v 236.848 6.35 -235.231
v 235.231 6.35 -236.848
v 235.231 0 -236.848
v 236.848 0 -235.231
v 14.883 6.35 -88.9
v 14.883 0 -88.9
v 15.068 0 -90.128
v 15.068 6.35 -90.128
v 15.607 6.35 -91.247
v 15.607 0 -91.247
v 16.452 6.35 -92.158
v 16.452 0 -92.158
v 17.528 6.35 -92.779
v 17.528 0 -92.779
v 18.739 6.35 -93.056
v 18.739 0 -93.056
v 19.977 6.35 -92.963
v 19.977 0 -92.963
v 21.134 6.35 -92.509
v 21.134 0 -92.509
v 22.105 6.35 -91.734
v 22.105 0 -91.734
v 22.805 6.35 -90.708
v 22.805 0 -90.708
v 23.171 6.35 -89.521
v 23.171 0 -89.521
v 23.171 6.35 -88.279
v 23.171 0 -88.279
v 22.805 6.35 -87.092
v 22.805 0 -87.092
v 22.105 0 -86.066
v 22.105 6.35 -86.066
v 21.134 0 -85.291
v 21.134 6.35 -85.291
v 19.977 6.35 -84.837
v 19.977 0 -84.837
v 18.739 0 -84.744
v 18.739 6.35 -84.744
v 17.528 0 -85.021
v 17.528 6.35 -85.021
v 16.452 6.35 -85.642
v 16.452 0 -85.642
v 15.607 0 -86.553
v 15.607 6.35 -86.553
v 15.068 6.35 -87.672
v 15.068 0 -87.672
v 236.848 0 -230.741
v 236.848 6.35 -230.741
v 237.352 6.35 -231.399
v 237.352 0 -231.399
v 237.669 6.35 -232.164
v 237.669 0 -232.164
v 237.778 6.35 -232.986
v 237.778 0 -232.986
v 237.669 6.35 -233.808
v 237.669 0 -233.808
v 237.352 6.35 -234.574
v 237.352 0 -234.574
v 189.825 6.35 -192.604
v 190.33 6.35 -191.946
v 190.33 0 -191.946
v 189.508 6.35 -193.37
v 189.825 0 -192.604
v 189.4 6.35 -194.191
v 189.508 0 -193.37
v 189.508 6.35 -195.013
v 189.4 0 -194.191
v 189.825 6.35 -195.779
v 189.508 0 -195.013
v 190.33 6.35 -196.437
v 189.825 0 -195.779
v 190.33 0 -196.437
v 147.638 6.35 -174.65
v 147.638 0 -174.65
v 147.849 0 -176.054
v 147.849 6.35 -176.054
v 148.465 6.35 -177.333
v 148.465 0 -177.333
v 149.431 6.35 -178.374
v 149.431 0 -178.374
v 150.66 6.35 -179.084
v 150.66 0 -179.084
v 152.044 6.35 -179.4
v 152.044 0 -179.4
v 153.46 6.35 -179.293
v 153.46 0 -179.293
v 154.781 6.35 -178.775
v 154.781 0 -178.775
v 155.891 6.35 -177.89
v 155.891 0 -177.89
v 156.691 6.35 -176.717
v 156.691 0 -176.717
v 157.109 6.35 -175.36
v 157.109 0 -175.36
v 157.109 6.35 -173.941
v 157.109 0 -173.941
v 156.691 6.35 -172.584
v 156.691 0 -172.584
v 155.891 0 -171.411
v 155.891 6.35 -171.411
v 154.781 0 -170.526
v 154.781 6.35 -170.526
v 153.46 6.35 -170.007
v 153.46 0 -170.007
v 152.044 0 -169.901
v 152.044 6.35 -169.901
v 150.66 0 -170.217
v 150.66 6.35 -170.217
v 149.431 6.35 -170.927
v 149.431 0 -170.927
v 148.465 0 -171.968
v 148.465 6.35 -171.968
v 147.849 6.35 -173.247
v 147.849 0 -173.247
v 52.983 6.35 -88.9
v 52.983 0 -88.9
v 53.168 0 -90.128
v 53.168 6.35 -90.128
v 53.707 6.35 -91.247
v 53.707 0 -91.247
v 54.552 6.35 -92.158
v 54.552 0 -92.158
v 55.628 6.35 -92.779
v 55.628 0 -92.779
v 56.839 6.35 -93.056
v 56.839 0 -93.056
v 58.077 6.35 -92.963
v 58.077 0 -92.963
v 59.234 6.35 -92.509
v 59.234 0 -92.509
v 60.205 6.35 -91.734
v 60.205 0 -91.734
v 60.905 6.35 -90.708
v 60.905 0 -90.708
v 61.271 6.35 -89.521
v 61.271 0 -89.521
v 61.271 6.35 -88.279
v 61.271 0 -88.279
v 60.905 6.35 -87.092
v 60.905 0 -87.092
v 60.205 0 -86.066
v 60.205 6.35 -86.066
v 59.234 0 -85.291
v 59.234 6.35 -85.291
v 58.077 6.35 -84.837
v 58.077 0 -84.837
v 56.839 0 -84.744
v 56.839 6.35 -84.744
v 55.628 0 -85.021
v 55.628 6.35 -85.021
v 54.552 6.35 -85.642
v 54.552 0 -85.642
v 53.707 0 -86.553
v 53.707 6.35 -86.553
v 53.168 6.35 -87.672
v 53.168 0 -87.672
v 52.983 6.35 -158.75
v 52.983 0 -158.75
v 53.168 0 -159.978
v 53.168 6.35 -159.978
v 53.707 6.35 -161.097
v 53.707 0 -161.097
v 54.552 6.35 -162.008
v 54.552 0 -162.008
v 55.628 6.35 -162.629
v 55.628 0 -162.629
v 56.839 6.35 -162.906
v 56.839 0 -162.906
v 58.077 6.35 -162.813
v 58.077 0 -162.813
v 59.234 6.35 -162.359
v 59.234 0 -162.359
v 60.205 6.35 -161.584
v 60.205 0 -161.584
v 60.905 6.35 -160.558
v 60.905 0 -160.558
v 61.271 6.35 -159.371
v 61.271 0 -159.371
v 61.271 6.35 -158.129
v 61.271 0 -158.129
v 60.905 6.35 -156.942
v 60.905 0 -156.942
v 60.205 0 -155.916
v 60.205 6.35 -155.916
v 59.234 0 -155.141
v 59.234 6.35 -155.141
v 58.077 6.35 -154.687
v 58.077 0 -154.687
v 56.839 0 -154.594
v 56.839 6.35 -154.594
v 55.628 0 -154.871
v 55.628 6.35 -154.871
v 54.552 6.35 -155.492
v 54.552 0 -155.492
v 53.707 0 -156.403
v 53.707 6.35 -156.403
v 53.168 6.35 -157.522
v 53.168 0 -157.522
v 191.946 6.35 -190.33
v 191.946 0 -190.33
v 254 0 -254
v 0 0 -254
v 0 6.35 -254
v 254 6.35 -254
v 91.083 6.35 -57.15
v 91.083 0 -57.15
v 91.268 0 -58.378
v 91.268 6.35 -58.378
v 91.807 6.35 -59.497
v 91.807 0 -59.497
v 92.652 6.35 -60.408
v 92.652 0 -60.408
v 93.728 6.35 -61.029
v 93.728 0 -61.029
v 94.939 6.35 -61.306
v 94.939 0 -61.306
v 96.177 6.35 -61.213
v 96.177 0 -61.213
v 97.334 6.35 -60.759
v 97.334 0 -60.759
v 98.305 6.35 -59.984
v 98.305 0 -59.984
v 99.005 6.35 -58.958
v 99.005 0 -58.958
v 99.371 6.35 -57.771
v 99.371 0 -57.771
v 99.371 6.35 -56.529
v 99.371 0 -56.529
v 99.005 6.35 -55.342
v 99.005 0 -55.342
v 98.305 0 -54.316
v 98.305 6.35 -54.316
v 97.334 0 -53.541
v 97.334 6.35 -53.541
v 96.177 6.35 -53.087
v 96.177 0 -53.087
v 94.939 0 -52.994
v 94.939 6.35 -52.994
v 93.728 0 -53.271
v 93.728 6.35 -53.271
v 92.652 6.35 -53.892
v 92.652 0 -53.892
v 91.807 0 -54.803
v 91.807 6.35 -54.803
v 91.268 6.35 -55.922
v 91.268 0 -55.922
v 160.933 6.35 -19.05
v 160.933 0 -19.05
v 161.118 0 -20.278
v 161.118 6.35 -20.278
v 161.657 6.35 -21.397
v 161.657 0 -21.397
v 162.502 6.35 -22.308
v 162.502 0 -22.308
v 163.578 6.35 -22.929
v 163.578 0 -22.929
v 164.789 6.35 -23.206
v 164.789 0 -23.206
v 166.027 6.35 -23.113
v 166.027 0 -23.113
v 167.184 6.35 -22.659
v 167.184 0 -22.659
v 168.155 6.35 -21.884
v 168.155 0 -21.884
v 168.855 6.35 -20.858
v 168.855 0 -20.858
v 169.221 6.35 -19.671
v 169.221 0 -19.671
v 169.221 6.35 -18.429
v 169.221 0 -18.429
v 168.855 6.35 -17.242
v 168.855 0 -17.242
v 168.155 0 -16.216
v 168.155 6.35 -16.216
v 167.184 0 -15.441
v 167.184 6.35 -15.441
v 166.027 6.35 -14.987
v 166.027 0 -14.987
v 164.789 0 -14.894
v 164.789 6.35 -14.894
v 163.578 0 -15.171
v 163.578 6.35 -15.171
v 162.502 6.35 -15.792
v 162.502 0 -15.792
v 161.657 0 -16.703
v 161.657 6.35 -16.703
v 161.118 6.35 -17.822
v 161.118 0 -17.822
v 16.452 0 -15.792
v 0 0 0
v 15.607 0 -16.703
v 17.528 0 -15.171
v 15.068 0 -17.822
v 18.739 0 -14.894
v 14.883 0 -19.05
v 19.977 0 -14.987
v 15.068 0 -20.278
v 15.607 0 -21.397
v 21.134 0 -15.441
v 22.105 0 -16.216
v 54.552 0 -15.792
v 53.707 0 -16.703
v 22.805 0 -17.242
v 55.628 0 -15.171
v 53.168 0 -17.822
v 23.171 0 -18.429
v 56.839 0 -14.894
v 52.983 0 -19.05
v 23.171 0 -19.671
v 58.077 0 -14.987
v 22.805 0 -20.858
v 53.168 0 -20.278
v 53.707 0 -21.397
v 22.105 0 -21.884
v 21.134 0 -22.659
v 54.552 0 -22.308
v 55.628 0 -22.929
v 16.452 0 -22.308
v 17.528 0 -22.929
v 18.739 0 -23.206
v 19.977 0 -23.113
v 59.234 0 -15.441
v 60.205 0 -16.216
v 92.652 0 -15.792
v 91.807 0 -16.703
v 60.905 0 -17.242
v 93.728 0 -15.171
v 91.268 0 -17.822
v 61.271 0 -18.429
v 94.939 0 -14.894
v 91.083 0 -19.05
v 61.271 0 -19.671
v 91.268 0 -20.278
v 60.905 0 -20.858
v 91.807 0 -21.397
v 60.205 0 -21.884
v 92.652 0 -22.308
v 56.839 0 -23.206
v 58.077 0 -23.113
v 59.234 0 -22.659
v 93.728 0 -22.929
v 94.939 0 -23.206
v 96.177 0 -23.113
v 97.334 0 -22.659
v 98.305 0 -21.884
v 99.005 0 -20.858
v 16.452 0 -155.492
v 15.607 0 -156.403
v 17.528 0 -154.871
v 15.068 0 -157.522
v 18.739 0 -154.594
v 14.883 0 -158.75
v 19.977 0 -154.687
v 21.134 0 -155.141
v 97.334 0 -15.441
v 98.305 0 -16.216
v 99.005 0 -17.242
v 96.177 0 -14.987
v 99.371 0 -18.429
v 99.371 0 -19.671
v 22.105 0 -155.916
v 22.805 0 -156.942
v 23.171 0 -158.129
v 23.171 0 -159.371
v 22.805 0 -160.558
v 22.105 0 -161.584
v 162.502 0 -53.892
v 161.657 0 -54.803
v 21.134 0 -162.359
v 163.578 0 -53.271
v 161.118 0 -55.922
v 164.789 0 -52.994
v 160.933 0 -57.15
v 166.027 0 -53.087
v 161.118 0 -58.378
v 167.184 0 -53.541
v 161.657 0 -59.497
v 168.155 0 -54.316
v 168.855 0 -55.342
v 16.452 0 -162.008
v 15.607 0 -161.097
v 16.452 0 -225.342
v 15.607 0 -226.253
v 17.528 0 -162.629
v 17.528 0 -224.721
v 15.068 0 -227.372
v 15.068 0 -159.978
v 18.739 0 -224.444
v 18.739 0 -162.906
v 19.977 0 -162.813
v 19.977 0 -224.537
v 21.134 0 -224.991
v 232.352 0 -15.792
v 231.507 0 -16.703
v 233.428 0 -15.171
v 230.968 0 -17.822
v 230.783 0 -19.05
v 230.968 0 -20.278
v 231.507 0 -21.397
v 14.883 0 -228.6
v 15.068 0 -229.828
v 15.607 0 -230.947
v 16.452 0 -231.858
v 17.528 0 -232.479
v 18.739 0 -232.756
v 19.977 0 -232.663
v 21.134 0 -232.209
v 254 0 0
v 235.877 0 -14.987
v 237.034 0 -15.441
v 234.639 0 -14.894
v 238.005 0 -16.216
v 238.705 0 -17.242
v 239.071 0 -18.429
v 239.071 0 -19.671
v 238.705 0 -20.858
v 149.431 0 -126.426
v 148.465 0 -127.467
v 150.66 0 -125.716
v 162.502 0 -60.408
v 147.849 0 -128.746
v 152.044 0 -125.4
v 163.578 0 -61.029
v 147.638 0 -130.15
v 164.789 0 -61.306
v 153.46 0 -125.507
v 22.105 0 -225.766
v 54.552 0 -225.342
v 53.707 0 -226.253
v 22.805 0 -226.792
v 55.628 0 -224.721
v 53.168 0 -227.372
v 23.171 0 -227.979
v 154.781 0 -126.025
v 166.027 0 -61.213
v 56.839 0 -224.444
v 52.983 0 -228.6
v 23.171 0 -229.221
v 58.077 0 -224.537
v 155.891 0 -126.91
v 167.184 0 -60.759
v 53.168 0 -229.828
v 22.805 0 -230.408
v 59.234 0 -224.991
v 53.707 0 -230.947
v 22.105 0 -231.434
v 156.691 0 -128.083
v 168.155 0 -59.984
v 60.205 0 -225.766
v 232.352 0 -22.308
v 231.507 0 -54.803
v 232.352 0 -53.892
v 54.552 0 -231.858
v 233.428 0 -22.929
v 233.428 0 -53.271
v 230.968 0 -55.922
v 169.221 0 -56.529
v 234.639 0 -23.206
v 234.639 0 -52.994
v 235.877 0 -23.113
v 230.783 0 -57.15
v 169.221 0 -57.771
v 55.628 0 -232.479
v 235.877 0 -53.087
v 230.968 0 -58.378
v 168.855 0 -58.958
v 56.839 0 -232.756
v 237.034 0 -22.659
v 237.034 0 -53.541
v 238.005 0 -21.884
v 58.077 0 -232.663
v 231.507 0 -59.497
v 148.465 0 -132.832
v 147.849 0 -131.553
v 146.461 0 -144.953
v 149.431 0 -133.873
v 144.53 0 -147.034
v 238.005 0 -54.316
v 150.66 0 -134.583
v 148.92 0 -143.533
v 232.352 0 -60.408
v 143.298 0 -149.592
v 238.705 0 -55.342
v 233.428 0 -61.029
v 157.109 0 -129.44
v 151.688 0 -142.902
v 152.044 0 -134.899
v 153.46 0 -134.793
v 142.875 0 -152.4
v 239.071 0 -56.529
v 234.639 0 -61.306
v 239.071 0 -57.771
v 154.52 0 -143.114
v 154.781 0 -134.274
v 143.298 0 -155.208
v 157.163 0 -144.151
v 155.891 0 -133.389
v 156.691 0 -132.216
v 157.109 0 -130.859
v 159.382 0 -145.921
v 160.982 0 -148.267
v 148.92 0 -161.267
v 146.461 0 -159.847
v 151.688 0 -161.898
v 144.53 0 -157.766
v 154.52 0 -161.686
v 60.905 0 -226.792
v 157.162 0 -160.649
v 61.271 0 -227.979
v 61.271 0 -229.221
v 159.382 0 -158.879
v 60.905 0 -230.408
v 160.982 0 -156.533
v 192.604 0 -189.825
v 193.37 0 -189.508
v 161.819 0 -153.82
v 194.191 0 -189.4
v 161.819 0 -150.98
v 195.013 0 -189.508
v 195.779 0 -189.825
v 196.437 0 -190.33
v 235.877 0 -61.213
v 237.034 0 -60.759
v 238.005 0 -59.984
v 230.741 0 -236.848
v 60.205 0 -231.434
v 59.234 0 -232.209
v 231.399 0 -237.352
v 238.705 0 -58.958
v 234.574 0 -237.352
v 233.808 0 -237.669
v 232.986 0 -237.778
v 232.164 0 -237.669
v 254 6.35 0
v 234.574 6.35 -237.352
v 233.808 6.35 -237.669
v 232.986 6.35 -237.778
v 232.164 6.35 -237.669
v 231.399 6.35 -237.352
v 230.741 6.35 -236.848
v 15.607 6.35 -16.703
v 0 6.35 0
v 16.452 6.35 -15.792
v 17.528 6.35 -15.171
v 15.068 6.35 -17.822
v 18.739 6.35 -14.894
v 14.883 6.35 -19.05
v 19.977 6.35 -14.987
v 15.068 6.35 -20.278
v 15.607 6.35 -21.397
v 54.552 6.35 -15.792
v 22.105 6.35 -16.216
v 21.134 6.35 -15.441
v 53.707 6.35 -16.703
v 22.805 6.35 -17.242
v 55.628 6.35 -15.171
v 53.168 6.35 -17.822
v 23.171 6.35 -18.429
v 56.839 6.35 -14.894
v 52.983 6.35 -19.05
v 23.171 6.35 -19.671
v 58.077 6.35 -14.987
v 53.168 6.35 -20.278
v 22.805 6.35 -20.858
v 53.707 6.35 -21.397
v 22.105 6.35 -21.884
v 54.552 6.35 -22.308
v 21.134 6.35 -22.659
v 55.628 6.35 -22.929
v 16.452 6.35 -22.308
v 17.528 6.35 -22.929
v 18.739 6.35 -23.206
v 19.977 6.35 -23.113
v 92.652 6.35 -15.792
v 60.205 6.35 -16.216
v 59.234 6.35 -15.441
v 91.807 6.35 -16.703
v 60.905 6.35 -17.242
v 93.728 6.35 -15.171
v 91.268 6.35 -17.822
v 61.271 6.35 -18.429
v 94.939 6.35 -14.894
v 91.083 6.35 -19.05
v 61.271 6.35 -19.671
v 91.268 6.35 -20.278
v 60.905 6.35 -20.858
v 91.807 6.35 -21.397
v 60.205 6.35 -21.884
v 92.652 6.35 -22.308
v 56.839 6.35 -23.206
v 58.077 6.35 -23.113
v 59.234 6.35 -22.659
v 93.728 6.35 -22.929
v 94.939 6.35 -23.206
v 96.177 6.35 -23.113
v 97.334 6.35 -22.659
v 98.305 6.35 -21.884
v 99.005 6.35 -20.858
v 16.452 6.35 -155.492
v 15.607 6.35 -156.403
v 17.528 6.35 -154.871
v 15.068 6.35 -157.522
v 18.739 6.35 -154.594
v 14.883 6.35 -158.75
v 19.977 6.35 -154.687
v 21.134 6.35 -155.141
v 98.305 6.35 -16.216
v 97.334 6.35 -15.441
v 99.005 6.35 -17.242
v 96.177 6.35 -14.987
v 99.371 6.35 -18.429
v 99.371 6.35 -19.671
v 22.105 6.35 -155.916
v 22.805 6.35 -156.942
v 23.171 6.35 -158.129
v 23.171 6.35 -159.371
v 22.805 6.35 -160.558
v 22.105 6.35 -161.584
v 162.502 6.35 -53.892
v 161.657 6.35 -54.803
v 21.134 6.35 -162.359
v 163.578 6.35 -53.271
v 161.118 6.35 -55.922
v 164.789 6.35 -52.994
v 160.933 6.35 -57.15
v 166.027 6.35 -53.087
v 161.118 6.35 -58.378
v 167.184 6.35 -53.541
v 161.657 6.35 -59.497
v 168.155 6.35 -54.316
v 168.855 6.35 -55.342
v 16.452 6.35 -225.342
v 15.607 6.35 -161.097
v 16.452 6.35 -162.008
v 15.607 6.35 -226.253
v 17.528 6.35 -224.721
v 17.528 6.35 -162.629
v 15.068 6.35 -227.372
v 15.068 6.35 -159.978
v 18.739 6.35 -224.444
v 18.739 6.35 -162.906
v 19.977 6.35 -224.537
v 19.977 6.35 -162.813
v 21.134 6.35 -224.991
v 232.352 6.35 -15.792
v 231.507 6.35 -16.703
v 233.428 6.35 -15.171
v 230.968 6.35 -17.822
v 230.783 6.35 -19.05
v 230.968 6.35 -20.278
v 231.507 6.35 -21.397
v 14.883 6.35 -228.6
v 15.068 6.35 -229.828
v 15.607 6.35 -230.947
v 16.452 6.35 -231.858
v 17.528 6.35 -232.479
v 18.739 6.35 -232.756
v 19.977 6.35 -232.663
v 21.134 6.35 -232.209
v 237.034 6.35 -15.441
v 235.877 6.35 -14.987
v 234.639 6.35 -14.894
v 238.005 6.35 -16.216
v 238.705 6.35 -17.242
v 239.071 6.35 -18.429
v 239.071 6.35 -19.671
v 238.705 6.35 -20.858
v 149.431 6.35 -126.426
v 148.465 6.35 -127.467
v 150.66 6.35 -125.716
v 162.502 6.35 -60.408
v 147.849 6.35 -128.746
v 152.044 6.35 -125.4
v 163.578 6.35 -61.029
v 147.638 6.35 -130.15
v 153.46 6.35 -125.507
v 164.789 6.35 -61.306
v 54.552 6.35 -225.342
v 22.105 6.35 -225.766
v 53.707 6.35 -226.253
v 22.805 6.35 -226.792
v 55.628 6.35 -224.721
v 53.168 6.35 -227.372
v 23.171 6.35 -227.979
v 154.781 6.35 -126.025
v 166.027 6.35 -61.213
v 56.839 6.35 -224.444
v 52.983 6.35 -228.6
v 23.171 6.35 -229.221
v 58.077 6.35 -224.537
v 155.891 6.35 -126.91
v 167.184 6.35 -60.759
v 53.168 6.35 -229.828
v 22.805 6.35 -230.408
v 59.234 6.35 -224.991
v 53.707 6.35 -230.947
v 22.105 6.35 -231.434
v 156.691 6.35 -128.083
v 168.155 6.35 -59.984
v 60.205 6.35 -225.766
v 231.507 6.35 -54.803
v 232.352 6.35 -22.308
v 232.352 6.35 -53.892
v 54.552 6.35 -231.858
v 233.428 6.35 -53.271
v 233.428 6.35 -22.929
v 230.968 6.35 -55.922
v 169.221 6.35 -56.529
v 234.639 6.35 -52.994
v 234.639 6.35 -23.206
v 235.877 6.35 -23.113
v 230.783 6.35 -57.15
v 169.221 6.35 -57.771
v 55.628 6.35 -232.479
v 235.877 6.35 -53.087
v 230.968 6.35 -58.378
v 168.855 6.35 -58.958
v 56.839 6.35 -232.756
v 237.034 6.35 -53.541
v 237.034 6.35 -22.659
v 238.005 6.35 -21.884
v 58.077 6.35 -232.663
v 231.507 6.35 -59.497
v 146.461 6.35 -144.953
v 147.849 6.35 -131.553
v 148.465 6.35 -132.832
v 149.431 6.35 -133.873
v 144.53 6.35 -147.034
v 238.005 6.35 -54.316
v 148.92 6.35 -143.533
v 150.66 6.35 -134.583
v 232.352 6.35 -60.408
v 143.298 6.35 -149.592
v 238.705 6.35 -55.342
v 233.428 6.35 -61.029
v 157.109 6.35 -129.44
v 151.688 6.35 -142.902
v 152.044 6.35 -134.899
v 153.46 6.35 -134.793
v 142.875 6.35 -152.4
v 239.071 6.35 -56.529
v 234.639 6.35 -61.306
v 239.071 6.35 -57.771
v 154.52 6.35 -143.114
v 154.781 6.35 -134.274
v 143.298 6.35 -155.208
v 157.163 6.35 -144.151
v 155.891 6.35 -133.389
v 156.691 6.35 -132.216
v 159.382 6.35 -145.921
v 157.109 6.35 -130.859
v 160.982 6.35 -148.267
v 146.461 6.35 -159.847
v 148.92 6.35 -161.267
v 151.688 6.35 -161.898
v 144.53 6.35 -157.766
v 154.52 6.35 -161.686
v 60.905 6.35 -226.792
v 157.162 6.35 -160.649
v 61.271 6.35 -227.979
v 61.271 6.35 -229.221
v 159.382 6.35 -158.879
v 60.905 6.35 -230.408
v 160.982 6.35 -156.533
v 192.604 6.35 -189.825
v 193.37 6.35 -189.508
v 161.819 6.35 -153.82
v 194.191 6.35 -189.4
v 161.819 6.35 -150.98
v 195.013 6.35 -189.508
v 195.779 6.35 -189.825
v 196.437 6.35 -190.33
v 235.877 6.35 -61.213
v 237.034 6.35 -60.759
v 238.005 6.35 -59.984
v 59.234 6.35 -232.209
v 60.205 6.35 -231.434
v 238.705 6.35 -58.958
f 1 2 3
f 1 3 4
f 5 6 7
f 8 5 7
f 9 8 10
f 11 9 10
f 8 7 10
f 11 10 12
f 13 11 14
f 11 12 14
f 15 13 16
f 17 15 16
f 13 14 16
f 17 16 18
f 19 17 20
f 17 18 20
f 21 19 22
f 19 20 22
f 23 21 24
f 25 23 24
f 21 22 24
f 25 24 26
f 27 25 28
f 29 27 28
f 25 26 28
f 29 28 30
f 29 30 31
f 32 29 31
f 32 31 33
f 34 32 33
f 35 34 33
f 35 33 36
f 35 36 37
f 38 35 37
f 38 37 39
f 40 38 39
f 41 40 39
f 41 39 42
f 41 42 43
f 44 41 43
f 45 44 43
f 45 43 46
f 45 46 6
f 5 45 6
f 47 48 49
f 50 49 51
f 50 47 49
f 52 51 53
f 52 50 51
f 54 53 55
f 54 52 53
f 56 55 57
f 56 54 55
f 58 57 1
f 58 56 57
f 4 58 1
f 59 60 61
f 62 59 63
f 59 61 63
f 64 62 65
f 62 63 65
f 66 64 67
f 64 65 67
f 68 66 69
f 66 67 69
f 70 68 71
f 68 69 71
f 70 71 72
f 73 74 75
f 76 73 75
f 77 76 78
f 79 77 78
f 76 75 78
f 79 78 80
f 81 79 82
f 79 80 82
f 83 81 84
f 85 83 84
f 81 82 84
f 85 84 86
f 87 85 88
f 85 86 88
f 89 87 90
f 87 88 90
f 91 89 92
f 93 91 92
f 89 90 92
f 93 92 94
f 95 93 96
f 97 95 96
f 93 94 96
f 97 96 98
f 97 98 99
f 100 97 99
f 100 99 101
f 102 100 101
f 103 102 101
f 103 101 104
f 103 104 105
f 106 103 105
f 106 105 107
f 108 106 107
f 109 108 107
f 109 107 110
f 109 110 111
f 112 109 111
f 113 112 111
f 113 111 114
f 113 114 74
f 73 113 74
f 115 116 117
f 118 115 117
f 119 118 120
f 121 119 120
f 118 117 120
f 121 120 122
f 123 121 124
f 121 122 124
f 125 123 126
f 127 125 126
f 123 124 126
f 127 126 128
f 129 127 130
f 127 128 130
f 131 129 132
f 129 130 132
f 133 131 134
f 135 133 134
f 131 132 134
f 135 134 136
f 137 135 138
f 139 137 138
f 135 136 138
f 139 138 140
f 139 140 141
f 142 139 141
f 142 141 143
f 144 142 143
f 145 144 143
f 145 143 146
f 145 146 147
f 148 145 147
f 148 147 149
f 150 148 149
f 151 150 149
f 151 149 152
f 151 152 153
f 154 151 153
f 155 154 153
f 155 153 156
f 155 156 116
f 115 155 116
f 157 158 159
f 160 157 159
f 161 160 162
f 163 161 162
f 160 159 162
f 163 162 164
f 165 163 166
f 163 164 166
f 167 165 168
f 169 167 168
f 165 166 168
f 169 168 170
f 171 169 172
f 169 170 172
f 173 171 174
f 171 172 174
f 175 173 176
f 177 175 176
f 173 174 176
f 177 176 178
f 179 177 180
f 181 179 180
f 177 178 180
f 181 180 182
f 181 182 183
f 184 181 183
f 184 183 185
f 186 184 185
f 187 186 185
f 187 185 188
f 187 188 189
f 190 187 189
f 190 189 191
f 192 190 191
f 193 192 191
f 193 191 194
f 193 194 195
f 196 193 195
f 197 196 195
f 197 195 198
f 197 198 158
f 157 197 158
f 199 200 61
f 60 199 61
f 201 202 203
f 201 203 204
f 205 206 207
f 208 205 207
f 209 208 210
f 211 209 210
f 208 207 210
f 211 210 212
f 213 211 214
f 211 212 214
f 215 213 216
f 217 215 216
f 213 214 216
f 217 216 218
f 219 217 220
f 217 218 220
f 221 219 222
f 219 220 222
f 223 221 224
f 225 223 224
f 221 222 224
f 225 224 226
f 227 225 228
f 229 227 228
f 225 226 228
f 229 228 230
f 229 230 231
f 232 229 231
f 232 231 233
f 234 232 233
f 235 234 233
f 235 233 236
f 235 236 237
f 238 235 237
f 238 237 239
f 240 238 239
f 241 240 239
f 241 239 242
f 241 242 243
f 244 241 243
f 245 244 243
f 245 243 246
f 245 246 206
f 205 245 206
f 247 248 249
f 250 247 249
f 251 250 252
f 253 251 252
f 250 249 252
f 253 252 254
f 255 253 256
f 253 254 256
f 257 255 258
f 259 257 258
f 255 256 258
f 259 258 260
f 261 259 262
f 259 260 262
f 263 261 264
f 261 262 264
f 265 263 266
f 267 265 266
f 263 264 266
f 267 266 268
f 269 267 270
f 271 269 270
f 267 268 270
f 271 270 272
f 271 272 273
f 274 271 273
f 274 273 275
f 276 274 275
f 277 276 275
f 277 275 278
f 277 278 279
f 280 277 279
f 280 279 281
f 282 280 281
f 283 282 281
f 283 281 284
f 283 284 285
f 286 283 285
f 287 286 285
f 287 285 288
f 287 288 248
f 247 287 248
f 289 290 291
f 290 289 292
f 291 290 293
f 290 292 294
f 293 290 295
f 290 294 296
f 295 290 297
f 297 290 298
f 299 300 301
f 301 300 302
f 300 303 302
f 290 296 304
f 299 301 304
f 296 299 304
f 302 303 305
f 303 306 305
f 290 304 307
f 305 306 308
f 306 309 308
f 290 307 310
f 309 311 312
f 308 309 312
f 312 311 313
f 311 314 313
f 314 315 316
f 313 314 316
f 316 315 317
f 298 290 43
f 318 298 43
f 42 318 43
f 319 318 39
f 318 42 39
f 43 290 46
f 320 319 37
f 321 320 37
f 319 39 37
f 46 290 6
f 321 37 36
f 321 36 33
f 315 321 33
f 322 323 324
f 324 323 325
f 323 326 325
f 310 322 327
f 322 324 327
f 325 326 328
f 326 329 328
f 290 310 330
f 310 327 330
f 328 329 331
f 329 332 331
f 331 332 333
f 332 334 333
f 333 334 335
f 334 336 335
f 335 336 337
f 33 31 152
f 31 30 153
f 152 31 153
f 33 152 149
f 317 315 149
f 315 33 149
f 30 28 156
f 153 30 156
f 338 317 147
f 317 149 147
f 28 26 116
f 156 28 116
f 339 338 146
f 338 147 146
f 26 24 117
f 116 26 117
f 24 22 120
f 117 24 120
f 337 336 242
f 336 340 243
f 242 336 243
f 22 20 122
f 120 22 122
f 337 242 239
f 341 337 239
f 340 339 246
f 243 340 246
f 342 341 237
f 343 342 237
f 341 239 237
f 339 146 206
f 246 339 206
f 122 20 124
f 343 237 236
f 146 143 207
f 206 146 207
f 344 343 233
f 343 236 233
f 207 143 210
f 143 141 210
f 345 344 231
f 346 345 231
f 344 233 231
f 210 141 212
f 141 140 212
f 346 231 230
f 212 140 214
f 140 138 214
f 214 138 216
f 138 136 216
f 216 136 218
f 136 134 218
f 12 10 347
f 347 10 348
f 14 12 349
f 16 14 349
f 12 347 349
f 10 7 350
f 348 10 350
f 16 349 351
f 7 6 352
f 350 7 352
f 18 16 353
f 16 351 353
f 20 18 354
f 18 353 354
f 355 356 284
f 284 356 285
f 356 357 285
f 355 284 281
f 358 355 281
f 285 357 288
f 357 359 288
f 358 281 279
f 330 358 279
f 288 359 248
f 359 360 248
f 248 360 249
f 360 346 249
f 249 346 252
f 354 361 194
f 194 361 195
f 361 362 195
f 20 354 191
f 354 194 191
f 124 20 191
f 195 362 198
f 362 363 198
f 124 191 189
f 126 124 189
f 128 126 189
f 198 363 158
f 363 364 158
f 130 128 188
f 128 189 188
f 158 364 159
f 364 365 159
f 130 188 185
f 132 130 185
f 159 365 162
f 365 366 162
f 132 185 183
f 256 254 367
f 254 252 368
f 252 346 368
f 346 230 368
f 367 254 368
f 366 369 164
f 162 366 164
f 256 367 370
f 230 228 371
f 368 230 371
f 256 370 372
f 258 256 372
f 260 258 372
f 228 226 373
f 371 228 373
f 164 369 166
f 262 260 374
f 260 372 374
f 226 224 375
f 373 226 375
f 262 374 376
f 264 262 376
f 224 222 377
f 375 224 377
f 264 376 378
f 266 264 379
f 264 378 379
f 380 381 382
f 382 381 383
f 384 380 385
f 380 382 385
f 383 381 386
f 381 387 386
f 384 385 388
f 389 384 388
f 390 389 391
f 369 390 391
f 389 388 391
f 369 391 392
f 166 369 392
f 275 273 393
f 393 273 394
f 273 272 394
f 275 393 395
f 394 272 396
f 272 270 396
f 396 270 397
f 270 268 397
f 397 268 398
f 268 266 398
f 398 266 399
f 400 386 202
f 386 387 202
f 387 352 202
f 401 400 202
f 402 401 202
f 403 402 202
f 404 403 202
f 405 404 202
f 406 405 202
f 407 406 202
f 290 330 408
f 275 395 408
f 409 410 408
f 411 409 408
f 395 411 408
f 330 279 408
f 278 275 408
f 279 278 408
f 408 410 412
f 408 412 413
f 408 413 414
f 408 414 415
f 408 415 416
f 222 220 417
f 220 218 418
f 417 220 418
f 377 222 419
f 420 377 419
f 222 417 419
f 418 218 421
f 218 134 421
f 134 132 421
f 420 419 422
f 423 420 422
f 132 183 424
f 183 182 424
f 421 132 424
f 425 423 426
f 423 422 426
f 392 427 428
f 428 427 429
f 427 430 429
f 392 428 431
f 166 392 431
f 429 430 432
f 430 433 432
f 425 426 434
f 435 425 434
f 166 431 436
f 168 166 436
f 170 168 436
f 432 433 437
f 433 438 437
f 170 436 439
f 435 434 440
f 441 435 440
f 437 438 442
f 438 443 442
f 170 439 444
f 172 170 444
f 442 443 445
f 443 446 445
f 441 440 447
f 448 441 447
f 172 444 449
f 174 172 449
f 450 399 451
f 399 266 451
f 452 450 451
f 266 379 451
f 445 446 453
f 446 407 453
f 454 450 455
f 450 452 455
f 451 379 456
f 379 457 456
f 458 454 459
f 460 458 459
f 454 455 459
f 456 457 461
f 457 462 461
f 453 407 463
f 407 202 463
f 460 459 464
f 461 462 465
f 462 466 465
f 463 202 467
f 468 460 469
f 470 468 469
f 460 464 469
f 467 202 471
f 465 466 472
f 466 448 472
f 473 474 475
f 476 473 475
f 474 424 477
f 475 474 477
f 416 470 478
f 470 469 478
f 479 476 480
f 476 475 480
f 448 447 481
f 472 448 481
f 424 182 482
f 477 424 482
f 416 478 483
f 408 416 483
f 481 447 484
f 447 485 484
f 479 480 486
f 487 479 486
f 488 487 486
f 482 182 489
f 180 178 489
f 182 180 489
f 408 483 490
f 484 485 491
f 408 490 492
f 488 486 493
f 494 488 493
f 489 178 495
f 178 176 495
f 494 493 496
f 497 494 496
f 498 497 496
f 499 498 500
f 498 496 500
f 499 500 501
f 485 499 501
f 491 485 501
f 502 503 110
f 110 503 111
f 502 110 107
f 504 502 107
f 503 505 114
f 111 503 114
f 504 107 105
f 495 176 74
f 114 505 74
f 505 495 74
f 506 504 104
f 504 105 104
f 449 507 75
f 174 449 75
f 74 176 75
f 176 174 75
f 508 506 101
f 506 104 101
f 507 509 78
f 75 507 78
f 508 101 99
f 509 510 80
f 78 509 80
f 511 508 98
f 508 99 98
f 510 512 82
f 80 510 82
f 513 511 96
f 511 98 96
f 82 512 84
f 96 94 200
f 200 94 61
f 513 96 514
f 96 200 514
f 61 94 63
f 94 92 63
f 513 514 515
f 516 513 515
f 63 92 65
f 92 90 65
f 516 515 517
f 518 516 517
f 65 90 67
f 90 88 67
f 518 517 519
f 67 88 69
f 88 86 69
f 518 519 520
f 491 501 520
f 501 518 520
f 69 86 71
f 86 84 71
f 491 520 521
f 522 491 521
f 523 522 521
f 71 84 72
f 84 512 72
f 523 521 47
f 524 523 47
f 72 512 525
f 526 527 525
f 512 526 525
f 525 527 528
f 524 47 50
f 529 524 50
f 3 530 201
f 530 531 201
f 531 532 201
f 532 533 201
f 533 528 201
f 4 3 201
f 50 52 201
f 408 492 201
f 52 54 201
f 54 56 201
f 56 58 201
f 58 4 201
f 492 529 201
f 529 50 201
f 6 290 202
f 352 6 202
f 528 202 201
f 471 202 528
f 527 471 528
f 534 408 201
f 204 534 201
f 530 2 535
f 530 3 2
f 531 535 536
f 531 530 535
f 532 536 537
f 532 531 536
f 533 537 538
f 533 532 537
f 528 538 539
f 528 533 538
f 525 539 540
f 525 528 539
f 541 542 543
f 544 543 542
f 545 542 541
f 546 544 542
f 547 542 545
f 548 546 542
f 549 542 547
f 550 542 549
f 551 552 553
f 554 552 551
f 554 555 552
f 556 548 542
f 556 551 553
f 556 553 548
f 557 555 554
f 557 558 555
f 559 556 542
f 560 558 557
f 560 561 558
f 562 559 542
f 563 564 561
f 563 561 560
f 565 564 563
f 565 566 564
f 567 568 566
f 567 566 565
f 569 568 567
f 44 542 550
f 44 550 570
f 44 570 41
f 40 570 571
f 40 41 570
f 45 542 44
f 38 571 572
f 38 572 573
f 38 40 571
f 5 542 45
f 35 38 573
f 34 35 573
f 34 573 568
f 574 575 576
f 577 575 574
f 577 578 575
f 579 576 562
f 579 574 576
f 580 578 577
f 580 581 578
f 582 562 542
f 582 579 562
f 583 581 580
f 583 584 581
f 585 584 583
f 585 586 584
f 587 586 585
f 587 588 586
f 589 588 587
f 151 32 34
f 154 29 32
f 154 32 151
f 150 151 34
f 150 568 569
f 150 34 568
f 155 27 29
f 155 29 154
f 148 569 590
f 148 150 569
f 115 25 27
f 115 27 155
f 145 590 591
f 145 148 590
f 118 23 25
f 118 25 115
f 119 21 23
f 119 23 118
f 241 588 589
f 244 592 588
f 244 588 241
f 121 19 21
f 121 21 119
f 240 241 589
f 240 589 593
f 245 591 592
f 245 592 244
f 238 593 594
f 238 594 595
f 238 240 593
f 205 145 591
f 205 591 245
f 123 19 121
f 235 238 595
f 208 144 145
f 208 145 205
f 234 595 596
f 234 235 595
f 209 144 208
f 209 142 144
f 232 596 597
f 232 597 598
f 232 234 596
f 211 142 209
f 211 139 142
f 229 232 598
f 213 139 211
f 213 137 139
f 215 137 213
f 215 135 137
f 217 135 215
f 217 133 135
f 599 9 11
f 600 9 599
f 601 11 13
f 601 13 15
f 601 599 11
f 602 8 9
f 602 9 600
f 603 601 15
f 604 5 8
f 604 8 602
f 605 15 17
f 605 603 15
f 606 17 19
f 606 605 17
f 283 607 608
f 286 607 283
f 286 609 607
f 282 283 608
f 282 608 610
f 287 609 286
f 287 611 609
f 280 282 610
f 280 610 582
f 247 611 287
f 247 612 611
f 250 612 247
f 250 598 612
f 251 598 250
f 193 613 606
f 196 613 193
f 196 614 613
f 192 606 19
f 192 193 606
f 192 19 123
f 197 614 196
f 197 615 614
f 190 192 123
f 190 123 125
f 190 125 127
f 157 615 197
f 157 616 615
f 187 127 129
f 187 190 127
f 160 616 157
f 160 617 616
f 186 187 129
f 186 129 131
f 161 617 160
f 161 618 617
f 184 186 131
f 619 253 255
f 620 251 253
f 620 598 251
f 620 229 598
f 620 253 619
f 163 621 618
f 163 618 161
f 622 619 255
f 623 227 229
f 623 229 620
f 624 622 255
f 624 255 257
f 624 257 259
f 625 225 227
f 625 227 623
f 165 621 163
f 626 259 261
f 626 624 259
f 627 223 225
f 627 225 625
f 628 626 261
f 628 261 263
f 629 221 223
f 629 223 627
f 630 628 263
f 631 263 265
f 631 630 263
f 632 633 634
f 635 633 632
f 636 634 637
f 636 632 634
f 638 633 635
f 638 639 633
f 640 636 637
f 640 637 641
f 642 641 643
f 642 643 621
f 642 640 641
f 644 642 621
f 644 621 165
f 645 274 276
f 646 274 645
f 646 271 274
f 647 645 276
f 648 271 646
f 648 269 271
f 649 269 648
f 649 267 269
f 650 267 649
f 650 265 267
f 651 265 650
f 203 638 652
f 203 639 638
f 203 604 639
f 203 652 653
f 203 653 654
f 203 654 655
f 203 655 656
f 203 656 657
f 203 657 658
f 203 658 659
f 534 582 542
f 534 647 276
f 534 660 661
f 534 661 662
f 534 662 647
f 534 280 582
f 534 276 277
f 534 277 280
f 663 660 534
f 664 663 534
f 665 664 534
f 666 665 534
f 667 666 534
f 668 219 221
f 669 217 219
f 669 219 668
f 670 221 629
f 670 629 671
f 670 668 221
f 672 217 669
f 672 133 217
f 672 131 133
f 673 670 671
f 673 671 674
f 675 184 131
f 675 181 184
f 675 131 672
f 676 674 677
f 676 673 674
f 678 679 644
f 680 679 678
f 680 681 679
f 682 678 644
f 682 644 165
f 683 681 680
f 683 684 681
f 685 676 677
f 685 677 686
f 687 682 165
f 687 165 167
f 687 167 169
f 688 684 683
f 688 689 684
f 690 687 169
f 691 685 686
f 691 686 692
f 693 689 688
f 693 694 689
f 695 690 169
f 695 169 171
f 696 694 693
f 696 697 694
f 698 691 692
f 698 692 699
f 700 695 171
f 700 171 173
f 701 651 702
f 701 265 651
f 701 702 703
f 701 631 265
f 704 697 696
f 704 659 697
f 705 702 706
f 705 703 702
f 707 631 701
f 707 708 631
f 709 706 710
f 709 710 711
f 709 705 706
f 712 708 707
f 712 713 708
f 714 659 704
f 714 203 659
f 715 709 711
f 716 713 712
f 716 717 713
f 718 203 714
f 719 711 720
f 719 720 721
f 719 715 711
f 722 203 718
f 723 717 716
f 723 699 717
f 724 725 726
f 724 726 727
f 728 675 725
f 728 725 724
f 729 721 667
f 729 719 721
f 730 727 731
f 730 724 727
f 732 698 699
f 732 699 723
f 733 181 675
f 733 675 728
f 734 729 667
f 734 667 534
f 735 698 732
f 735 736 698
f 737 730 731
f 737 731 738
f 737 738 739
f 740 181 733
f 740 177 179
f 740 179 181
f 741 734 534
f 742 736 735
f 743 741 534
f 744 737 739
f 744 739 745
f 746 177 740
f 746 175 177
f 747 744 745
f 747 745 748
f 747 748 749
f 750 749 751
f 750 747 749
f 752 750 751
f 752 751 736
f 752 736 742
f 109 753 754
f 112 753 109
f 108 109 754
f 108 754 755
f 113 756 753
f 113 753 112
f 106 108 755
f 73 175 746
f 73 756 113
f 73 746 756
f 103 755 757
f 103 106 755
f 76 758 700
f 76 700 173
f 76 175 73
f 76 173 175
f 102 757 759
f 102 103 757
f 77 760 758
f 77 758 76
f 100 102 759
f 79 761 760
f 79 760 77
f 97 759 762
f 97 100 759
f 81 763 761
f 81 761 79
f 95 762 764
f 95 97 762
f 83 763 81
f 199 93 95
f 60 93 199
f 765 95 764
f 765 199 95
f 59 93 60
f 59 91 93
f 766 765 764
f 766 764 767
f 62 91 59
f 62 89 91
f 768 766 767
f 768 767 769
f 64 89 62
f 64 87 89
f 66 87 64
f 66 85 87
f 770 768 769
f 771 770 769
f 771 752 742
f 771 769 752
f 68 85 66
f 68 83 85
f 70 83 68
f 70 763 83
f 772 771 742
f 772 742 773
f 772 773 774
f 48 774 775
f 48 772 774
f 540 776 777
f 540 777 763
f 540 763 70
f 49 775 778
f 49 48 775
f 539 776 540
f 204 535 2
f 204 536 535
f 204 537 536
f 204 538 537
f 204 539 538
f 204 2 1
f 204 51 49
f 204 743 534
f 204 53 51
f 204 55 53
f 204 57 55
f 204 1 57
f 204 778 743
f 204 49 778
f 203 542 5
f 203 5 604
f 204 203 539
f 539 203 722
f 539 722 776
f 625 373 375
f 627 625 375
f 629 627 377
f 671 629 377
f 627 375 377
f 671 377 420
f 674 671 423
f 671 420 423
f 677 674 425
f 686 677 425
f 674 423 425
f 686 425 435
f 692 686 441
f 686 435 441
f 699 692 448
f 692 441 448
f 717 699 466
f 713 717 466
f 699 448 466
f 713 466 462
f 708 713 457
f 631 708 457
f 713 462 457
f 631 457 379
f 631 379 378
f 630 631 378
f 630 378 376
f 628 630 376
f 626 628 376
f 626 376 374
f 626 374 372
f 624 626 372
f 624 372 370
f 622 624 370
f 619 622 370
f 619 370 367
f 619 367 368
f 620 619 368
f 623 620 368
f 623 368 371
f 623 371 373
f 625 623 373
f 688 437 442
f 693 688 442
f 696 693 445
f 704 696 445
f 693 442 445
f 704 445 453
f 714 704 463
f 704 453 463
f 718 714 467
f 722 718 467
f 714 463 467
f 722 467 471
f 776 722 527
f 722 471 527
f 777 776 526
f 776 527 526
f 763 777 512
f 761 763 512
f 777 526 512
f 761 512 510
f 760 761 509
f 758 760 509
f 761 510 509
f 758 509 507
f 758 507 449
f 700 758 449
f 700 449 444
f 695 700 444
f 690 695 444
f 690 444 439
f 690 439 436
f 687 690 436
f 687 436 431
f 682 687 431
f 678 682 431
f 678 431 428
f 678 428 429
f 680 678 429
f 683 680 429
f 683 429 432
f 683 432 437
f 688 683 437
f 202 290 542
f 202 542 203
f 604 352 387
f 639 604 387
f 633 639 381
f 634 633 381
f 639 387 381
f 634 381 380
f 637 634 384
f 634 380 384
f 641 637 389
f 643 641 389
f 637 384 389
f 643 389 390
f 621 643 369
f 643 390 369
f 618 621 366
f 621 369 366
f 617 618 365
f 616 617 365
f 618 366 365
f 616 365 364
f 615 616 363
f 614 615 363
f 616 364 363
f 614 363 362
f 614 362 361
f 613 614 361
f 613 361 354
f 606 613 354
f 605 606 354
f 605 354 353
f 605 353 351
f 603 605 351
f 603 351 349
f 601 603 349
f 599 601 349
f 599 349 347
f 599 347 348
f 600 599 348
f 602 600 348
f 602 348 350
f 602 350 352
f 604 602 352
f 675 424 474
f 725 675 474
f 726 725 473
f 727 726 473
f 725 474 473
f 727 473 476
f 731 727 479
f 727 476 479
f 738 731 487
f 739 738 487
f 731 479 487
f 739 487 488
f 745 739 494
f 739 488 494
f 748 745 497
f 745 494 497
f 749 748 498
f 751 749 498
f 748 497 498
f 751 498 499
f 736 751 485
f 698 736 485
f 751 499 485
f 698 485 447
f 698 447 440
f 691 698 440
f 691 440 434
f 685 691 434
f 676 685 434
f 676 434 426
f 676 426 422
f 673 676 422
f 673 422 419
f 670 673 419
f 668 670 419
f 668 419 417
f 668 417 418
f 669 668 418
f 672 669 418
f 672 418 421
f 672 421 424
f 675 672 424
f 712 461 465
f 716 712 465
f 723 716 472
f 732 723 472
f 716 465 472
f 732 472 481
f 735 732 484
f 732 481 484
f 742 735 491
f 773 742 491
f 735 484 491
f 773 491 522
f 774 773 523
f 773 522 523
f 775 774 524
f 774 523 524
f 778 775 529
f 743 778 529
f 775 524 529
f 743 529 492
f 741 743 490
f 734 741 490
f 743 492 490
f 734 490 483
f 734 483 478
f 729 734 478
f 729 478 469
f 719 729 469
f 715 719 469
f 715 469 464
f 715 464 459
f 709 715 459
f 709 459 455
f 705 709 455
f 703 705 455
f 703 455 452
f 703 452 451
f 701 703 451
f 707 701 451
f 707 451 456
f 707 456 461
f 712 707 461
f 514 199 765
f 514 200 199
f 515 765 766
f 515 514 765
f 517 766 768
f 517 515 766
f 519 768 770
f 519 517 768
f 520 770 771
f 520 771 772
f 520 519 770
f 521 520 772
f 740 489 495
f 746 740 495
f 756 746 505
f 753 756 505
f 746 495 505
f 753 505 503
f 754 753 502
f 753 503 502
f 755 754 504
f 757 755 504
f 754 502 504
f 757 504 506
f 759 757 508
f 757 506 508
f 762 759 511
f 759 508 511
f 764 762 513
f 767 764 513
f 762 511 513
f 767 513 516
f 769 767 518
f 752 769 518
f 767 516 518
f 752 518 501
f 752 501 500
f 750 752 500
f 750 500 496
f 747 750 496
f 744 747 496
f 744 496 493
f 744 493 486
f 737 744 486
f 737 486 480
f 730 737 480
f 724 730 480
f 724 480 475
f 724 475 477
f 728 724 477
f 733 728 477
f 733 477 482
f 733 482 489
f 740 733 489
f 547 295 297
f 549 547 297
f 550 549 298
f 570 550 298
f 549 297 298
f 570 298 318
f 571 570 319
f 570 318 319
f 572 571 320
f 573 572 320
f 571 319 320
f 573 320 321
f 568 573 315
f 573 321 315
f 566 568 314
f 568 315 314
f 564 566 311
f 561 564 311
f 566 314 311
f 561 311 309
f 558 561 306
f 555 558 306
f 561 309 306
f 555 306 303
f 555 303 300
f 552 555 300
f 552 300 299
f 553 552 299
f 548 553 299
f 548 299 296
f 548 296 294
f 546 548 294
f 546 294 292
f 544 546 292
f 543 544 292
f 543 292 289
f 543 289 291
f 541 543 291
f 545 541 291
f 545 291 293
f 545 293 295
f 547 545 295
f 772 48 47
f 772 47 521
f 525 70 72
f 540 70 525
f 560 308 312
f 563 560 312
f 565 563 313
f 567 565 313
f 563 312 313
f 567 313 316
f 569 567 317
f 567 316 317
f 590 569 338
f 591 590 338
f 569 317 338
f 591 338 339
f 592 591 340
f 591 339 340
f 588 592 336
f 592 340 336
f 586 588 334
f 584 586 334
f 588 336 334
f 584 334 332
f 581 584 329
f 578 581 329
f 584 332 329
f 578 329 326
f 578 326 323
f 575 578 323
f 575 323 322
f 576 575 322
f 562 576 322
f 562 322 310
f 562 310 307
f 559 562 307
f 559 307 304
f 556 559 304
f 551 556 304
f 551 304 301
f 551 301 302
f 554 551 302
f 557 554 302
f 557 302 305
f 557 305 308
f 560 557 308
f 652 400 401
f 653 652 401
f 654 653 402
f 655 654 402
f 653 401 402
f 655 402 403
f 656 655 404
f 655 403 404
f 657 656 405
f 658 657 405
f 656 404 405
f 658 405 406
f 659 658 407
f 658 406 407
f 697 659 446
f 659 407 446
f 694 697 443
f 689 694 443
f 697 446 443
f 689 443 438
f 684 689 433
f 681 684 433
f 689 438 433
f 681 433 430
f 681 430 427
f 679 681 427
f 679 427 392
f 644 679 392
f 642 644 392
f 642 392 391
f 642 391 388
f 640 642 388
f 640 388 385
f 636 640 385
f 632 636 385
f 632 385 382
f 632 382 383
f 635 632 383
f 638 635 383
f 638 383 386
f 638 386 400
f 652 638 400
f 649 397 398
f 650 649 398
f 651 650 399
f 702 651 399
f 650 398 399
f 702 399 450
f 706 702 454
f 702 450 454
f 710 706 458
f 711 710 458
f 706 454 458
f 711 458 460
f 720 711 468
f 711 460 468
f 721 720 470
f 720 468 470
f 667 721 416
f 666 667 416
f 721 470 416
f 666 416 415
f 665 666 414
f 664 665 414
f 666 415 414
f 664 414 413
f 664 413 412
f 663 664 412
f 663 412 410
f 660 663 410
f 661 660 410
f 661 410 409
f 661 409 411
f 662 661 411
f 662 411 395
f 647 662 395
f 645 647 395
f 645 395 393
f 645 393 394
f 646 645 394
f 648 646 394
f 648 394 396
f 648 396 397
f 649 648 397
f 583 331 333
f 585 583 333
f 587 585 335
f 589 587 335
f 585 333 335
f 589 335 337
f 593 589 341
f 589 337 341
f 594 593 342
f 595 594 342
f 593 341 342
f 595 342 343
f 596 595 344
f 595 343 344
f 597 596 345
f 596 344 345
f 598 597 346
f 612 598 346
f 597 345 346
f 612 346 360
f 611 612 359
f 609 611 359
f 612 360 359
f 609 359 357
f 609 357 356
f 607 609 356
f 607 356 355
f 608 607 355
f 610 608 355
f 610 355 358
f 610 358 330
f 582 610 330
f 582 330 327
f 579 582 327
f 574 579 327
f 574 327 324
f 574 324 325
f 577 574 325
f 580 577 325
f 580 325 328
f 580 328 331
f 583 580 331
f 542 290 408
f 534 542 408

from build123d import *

# Parameters (mm, degrees)
SKETCH1_W                        = 254
SKETCH1_H                        = 254
BOSS_EXTRUDE1_DEPTH              = 6.35
F_3_4_0_75_DIAMETER_HOLE1_D      = 19.05
F_3_8_0_375_DIAMETER_HOLE1_D     = 9.525
F_21_64_0_32813_DIAMETER_HOLE1_D = 8.334502
LPATTERN1_COUNT                  = 2
LPATTERN1_PITCH                  = 38.1
LPATTERN1_COUNT_DIR2             = 4
LPATTERN1_PITCH_DIR2             = 69.85
F_21_64_0_32813_DIAMETER_HOLE2_D = 8.334502
LPATTERN2_COUNT                  = 2
LPATTERN2_PITCH                  = 38.1
LPATTERN2_COUNT_DIR2             = 3
LPATTERN2_PITCH_DIR2             = 69.85
CUT_EXTRUDE1_DEPTH               = 360.266367059
FILLET1_R                        = 3.175


with BuildPart() as part:
    # Sketch1 → Boss-Extrude1 (new body)
    with BuildSketch(Plane(origin=(0, 0, 0), x_dir=(1, 0, 0), z_dir=(0, 1, 0))):
        with Locations((127, 127)):
            Rectangle(SKETCH1_W, SKETCH1_H)
    extrude(amount=BOSS_EXTRUDE1_DEPTH)

    # 3/4 (0.75) Diameter Hole1 (through all)
    with Locations(Plane(origin=(0, 6.35, 0), x_dir=(1, 0, 0), z_dir=(0, 1, 0))):
        with Locations((152.4, 152.4)):
            Hole(F_3_4_0_75_DIAMETER_HOLE1_D / 2)

    # 3/8 (0.375) Diameter Hole1 (through all)
    with Locations(Plane(origin=(0, 6.35, 0), x_dir=(1, 0, 0), z_dir=(0, 1, 0))):
        with Locations((152.4, 174.6504), (152.4, 130.1496)):
            Hole(F_3_8_0_375_DIAMETER_HOLE1_D / 2)

    # 21/64 (0.32813) Diameter Hole1 (through all)
    with Locations(Plane(origin=(0, 6.35, 0), x_dir=(1, 0, 0), z_dir=(0, 1, 0))):
        with Locations((19.05, 19.05)):
            f_21_64_0_32813_diameter_hole1 = Hole(F_21_64_0_32813_DIAMETER_HOLE1_D / 2)

    # LPattern1: 21_64 _0.32813_ Diameter Hole1 2 × 4
    with Locations(*[(i * LPATTERN1_PITCH, 0, -j * LPATTERN1_PITCH_DIR2) for i in range(LPATTERN1_COUNT) for j in range(LPATTERN1_COUNT_DIR2) if (i, j) != (0, 0)]):
        add(f_21_64_0_32813_diameter_hole1, mode=Mode.SUBTRACT)

    # 21/64 (0.32813) Diameter Hole2 (through all)
    with Locations(Plane(origin=(0, 6.35, 0), x_dir=(1, 0, 0), z_dir=(0, 1, 0))):
        with Locations((234.95, 19.05)):
            f_21_64_0_32813_diameter_hole2 = Hole(F_21_64_0_32813_DIAMETER_HOLE2_D / 2)

    # LPattern2: 21_64 _0.32813_ Diameter Hole2 2 × 3
    with Locations(*[(-j * LPATTERN2_PITCH_DIR2, 0, -i * LPATTERN2_PITCH) for i in range(LPATTERN2_COUNT) for j in range(LPATTERN2_COUNT_DIR2) if (i, j) != (0, 0)]):
        add(f_21_64_0_32813_diameter_hole2, mode=Mode.SUBTRACT)

    # Sketch10 → Cut-Extrude1 (cut, through all)
    with BuildSketch(Plane(origin=(0, 6.35, 0), x_dir=(1, 0, 0), z_dir=(0, 1, 0))):
        Polygon((188.084920071, 194.191494234), (232.986200677, 239.092774839), (239.092774839, 232.986200677), (194.191494234, 188.084920071), align=None)
    extrude(amount=-CUT_EXTRUDE1_DEPTH, mode=Mode.SUBTRACT)

    # Fillet1
    fillet1_edges = [part.edges().sort_by_distance(p)[0] for p in [
        (194.191494234, 3.175, -188.084920071),
        (188.084920071, 3.175, -194.191494234),
        (232.986200677, 3.175, -239.092774839),
        (239.092774839, 3.175, -232.986200677),
    ]]
    fillet(fillet1_edges, radius=FILLET1_R)


solid = part.part
